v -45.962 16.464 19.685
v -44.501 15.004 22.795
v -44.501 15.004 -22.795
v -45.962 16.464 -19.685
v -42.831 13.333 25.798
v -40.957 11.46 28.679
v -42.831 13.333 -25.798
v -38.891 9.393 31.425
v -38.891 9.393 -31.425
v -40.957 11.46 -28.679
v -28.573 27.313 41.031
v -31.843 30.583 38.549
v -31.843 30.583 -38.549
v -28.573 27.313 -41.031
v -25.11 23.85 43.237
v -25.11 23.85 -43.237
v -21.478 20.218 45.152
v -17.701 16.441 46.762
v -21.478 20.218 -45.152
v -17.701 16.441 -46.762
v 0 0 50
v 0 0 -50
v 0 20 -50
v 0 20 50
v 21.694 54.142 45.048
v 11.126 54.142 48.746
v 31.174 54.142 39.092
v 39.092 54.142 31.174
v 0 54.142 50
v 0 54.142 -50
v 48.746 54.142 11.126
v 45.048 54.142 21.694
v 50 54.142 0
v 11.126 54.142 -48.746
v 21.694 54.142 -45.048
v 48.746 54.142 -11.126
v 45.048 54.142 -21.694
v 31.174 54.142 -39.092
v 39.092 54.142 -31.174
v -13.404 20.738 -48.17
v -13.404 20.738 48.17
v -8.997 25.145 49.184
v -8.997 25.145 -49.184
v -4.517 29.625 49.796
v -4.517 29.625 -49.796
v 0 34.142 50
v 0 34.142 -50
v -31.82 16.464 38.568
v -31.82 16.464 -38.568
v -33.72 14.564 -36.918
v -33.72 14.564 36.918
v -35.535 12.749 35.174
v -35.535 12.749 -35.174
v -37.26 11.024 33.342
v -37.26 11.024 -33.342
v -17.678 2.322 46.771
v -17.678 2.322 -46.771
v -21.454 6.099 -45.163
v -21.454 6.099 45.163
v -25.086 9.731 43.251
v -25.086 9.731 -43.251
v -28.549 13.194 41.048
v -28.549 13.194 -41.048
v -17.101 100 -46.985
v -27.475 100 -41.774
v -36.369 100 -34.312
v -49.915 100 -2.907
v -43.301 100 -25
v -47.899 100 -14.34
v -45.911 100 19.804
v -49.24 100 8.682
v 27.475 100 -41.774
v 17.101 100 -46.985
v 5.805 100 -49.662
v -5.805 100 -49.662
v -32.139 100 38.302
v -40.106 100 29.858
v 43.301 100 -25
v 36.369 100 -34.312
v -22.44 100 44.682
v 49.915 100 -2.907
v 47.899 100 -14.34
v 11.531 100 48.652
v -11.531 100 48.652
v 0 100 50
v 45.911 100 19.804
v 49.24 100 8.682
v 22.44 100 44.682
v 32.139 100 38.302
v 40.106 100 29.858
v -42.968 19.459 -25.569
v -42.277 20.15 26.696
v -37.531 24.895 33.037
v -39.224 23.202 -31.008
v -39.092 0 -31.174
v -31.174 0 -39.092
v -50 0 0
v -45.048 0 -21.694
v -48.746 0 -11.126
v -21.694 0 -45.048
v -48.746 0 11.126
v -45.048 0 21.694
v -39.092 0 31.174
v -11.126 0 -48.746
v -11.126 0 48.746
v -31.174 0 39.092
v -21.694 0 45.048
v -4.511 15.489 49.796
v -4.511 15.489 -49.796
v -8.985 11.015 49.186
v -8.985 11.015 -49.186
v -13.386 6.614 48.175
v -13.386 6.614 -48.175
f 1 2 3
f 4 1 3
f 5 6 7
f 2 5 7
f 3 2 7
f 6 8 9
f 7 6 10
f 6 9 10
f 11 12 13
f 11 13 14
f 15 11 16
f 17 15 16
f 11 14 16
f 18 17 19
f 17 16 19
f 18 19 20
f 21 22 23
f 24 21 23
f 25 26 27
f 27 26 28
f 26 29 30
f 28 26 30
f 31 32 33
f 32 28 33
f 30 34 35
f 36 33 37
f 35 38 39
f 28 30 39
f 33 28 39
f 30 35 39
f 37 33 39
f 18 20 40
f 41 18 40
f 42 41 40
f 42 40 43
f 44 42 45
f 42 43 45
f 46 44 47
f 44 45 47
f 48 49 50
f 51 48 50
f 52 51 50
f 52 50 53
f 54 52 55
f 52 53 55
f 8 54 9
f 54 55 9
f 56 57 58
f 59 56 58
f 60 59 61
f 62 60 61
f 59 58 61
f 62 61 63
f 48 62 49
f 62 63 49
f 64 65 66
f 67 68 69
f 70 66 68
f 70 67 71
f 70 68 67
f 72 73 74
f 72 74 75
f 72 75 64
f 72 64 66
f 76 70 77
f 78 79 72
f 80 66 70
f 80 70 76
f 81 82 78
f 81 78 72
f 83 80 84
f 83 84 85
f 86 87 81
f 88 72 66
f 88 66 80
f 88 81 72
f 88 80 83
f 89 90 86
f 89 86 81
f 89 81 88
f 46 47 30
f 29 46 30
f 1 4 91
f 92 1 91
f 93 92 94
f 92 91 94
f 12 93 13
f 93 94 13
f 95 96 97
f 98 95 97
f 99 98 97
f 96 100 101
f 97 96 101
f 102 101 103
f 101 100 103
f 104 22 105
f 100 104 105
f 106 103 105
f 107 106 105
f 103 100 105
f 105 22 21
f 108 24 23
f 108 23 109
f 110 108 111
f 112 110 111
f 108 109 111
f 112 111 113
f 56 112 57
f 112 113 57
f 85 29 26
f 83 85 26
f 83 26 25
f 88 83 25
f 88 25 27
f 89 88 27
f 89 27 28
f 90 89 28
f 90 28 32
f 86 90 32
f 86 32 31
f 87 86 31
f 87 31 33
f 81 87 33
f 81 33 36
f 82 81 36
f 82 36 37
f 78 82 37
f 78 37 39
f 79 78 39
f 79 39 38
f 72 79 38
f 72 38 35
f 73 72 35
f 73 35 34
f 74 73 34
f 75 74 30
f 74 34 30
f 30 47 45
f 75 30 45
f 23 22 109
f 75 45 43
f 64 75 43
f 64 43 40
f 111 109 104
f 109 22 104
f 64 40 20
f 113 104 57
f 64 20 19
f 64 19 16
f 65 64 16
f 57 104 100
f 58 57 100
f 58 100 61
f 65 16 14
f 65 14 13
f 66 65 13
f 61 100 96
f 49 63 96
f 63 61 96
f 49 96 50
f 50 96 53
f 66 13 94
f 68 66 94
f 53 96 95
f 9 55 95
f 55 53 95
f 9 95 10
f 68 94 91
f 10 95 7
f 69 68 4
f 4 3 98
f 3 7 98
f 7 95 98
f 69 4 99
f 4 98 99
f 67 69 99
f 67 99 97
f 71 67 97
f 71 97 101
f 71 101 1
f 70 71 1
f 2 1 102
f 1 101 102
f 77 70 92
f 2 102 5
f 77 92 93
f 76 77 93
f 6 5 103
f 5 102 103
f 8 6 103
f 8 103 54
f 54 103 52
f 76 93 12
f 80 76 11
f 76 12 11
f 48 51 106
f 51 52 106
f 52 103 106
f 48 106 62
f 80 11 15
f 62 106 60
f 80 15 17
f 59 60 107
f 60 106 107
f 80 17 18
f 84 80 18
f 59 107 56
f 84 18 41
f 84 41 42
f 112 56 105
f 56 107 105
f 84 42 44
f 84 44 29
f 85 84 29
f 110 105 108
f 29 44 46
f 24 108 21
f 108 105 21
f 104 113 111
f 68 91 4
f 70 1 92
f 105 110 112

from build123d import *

# Parameters (mm, degrees)
SKETCH_1_R               = 50
EXTRUDE_1_DEPTH          = 100
CUT_EXTRUDE_1_DEPTH      = 123.474487139
CUT_EXTRUDE_1_DEPTH_BACK = 123.474487139


with BuildPart() as part:
    # 草图1 → 凸台-拉伸1 (new body)
    with BuildSketch(Plane(origin=(0, 0, 0), x_dir=(1, 0, 0), z_dir=(0, 1, 0))):
        with Locations(Location((0, 0, 0), (0, 0, 270))):
            Circle(SKETCH_1_R)
    extrude(amount=EXTRUDE_1_DEPTH)

    # 草图2 → 切除-拉伸1 (cut, two sides: drawn at the far end of the back side and taken through both)
    with BuildSketch(Plane.XY.offset(-CUT_EXTRUDE_1_DEPTH_BACK)):
        Polygon((0, 0), (0, 20), (-17.67766953, 2.32233047), (-31.819805153, 16.464466094), (-38.890872965, 9.393398282), (-45.961940777, 16.464466094), (-31.843330798, 30.583076073), (-17.701195174, 16.440940449), (0, 34.142135624), (0, 54.142135624), (63.983037585, 54.142135624), (63.983037585, 0), align=None)
    extrude(amount=CUT_EXTRUDE_1_DEPTH + CUT_EXTRUDE_1_DEPTH_BACK, mode=Mode.SUBTRACT)


solid = part.part
